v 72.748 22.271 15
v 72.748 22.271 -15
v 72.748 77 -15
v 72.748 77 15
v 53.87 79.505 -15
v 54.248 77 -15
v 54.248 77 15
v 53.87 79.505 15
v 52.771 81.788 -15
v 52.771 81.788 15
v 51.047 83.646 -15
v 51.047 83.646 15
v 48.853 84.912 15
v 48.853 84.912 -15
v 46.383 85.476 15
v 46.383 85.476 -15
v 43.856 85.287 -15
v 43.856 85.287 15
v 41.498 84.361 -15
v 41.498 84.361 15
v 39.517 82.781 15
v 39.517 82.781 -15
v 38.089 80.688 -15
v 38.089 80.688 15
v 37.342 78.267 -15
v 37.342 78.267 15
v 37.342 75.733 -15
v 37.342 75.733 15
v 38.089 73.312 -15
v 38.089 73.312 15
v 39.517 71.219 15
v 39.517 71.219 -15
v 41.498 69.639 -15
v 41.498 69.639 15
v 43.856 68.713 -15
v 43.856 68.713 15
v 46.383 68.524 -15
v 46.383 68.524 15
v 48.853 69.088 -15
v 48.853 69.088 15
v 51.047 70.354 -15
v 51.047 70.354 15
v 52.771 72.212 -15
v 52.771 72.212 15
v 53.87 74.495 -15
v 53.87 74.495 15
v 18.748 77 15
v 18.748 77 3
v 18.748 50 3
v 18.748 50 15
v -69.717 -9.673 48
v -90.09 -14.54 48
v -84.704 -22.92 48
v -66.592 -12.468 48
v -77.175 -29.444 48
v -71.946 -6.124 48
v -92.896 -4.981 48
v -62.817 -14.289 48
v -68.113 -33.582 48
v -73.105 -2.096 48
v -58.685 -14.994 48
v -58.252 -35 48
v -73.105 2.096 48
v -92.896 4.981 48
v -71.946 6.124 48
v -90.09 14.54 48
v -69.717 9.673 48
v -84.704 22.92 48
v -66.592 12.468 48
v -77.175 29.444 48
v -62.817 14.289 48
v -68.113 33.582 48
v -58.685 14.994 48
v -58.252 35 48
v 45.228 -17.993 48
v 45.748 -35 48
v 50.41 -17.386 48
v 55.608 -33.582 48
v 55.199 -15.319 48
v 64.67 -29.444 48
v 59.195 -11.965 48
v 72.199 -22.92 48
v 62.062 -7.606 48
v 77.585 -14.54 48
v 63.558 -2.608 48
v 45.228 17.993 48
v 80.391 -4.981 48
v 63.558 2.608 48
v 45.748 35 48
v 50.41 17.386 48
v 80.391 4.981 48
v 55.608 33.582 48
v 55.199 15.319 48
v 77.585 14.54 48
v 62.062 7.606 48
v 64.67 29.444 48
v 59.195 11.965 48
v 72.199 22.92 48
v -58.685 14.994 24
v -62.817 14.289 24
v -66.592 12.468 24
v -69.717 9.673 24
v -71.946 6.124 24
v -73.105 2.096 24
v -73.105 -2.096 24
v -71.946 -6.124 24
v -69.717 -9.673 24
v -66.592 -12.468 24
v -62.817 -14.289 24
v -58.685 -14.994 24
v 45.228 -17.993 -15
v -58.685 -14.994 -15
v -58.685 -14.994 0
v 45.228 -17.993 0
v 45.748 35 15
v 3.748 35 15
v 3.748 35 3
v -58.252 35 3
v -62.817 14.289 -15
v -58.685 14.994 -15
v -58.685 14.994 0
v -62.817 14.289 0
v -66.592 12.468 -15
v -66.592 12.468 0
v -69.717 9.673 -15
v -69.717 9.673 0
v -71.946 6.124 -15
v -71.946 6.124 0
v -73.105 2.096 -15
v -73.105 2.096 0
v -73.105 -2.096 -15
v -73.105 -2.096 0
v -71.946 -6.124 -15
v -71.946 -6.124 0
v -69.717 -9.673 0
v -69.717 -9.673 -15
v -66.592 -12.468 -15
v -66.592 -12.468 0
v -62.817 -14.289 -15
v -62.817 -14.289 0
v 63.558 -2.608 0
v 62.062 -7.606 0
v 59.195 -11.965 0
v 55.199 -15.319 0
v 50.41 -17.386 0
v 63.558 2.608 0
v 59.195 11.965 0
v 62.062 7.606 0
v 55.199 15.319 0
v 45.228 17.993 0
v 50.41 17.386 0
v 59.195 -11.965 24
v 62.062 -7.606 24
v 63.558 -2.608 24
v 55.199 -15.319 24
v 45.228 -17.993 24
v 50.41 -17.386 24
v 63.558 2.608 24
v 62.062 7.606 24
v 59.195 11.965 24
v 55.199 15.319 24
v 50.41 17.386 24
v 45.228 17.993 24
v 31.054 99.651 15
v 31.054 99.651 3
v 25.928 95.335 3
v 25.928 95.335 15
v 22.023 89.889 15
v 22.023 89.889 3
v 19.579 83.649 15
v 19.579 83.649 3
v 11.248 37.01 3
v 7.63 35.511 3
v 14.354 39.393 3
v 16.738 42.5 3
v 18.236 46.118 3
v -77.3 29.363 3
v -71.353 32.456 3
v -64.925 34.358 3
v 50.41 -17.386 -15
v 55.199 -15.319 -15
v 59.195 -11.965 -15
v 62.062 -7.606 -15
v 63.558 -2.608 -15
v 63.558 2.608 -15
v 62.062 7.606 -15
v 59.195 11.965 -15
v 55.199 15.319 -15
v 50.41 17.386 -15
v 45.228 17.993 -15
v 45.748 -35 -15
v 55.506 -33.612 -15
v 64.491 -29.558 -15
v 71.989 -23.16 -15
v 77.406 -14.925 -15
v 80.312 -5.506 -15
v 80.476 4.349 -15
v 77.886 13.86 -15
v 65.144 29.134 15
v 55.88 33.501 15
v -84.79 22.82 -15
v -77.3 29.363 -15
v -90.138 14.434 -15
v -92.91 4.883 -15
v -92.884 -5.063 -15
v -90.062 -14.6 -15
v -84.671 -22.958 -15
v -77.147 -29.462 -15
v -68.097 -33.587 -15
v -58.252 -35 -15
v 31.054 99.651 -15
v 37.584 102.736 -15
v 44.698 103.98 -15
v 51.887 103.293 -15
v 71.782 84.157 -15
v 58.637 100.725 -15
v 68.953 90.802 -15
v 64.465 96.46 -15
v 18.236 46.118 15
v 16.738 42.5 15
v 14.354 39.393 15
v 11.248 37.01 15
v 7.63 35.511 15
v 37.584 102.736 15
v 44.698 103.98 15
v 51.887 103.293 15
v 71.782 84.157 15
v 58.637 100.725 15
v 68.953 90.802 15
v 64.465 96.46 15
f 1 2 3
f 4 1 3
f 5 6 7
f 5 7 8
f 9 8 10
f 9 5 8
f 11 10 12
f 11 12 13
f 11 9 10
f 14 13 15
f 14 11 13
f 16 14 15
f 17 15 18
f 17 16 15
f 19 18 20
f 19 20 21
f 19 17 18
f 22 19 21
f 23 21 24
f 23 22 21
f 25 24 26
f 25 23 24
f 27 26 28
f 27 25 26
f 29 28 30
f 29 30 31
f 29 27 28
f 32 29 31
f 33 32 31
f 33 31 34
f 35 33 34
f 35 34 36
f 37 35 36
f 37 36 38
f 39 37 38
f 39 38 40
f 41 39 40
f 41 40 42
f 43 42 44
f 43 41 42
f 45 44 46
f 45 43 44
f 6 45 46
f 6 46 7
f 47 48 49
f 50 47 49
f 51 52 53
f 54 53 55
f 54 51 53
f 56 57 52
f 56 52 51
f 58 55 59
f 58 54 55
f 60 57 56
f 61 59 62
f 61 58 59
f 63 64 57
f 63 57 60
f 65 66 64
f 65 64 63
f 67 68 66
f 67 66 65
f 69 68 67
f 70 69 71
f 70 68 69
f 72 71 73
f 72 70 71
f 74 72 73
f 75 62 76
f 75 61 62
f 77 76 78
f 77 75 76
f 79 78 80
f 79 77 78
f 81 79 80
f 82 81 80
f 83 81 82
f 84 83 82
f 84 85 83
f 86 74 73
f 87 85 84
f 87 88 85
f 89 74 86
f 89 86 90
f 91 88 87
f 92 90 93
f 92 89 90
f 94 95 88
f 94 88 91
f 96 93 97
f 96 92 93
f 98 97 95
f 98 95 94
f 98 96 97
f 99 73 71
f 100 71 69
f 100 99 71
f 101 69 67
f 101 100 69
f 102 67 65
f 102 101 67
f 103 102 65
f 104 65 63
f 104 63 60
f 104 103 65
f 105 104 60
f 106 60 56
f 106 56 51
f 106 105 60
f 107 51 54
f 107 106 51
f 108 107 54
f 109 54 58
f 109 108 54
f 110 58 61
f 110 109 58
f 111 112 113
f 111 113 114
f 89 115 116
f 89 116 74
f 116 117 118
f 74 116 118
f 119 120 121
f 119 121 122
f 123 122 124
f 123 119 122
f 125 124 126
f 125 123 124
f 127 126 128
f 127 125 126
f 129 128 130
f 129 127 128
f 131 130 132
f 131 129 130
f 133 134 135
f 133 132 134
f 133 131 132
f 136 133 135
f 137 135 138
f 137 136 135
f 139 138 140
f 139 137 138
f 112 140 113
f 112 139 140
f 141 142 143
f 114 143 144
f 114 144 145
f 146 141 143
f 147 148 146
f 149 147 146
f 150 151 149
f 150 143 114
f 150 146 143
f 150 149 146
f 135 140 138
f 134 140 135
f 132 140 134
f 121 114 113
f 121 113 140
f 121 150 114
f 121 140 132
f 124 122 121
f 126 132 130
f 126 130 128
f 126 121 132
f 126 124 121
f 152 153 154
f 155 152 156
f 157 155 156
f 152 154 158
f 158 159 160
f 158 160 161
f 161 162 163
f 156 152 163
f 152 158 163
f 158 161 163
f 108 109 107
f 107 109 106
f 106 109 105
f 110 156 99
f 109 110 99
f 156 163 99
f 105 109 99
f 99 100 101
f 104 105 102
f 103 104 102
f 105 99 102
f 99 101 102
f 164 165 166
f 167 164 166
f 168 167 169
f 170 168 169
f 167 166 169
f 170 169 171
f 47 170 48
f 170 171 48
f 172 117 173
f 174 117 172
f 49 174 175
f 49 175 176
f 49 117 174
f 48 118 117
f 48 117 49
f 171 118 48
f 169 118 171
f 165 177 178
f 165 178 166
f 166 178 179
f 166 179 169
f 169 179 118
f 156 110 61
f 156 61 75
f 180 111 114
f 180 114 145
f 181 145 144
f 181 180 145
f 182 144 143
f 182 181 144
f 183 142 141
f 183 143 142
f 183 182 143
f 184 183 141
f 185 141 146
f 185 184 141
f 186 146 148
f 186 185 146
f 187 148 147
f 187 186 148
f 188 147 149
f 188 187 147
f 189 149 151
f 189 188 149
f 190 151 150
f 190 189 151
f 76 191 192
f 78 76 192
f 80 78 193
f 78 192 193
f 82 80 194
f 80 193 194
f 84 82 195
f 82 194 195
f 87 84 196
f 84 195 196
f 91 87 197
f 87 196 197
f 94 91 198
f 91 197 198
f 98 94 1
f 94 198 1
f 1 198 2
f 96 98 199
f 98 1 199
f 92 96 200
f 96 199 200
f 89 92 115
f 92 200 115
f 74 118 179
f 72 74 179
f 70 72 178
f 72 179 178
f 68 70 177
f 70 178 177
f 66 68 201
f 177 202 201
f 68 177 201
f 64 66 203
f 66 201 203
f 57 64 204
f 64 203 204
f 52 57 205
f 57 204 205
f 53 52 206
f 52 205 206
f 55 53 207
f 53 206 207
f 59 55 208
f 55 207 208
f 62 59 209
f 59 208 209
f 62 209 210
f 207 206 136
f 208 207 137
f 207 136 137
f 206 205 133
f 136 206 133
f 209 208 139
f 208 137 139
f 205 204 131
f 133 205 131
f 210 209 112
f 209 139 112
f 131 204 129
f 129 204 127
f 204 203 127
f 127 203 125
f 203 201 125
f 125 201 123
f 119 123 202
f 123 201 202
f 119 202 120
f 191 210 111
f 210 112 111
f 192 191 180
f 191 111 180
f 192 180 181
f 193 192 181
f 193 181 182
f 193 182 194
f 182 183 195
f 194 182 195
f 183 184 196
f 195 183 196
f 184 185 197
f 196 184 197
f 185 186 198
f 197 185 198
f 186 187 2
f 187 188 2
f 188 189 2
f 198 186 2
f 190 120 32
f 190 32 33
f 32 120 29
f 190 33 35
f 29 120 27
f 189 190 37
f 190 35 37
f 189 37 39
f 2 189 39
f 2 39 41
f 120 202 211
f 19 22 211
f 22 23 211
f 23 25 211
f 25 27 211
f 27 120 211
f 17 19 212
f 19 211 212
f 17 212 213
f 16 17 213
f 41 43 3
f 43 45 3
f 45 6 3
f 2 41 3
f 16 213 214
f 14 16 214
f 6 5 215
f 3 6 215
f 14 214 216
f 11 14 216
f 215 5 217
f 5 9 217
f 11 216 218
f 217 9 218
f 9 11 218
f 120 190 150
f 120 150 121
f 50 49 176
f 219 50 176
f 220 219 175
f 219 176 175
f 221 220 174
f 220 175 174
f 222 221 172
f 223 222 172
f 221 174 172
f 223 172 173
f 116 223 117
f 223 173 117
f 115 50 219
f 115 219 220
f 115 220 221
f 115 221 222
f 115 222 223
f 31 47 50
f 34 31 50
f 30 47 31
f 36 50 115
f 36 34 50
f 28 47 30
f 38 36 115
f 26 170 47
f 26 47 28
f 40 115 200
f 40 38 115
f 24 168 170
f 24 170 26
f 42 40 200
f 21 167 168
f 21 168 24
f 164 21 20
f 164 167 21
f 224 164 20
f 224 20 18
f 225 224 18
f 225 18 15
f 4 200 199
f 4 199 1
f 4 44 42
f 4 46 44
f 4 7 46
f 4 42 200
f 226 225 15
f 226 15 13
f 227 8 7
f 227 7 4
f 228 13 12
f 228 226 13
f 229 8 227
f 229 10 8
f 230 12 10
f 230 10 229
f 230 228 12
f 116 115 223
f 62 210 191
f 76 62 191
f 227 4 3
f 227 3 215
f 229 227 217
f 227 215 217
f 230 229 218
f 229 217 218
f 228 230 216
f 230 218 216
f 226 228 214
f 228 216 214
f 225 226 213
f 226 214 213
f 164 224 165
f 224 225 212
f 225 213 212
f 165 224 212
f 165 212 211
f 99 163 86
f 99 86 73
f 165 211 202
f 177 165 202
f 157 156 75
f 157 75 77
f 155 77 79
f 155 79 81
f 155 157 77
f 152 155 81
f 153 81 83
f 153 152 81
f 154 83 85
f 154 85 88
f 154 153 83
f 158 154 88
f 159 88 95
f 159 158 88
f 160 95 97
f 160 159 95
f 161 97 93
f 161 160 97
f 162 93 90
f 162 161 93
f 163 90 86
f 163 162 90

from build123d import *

# Parameters (mm, degrees)
BOSS_EXTRUDE3_DEPTH      = 48
BOSS_EXTRUDE3_DEPTH_BACK = 15
BOSS_EXTRUDE4_DEPTH      = 24
BOSS_EXTRUDE5_DEPTH      = 15
BOSS_EXTRUDE5_DEPTH_BACK = 15
SKETCH2_6_R              = 8.5
BOSS_EXTRUDE6_DEPTH      = 3
BOSS_EXTRUDE6_DEPTH_BACK = 15


with BuildPart() as part:
    # Sketch2 → Boss-Extrude3 (new, two sides: drawn at the far end of the back side and taken through both)
    with BuildSketch(Plane.XY.offset(-BOSS_EXTRUDE3_DEPTH_BACK)):
        with BuildLine():
            Line((3.747556009, 35), (-58.252443991, 35))
            ThreePointArc((-58.252443991, 35), (-68.184558925, 33.56118432), (-77.300074847, 29.363033883))
            ThreePointArc((-77.300074847, 29.363033883), (-91.813628311, -9.932114934), (-58.252443991, -35))
            Line((-58.252443991, -35), (45.747556009, -35))
            ThreePointArc((45.747556009, -35), (77.405785672, -14.925029132), (72.747556009, 22.271057451))
            ThreePointArc((72.747556009, 22.271057451), (60.672585141, 31.658229663), (45.747556009, 35))
            Line((45.747556009, 35), (3.747556009, 35))
        make_face()
        with BuildLine():
            Line((-58.685136299, 14.993757947), (45.22832524, 17.992509536))
            ThreePointArc((45.22832524, 17.992509536), (63.747556009, 0), (45.22832524, -17.992509536))
            Line((45.22832524, -17.992509536), (-58.685136299, -14.993757947))
            ThreePointArc((-58.685136299, -14.993757947), (-73.252443991, 0), (-58.685136299, 14.993757947))
        make_face(mode=Mode.SUBTRACT)
    extrude(amount=BOSS_EXTRUDE3_DEPTH + BOSS_EXTRUDE3_DEPTH_BACK)

    # Sketch2<5> → Boss-Extrude4 (add)
    with BuildSketch(Plane.XY):
        with BuildLine():
            ThreePointArc((45.22832524, -17.992509536), (63.747556009, 0), (45.22832524, 17.992509536))
            Line((45.22832524, 17.992509536), (-58.685136299, 14.993757947))
            ThreePointArc((-58.685136299, 14.993757947), (-73.252443991, 0), (-58.685136299, -14.993757947))
            Line((-58.685136299, -14.993757947), (45.22832524, -17.992509536))
        make_face()
    extrude(amount=BOSS_EXTRUDE4_DEPTH)

    # Sketch2<6> → Boss-Extrude5 (add, two sides: drawn at the far end of the back side and taken through both)
    with BuildSketch(Plane.XY.offset(-BOSS_EXTRUDE5_DEPTH_BACK)):
        with BuildLine():
            ThreePointArc((18.747556009, 50), (14.354157727, 39.393398282), (3.747556009, 35))
            Line((3.747556009, 35), (45.747556009, 35))
            ThreePointArc((45.747556009, 35), (60.672585141, 31.658229663), (72.747556009, 22.271057451))
            Line((72.747556009, 22.271057451), (72.747556009, 77))
            ThreePointArc((72.747556009, 77), (58.636796874, 100.724828132), (31.053669349, 99.651483281))
            ThreePointArc((31.053669349, 99.651483281), (22.022727876, 89.889240866), (18.747556009, 77))
            Line((18.747556009, 77), (18.747556009, 50))
        make_face()
        with Locations((45.747556009, 77)):
            Circle(SKETCH2_6_R, mode=Mode.SUBTRACT)
    extrude(amount=BOSS_EXTRUDE5_DEPTH + BOSS_EXTRUDE5_DEPTH_BACK)

    # Sketch2<7> → Boss-Extrude6 (add, two sides: drawn at the far end of the back side and taken through both)
    with BuildSketch(Plane.XY.offset(-BOSS_EXTRUDE6_DEPTH_BACK)):
        with BuildLine():
            ThreePointArc((-77.300074847, 29.363033883), (-68.184558925, 33.56118432), (-58.252443991, 35))
            Line((-58.252443991, 35), (3.747556009, 35))
            ThreePointArc((3.747556009, 35), (14.354157727, 39.393398282), (18.747556009, 50))
            Line((18.747556009, 50), (18.747556009, 77))
            ThreePointArc((18.747556009, 77), (22.022727876, 89.889240866), (31.053669349, 99.651483281))
            Line((31.053669349, 99.651483281), (-77.300074847, 29.363033883))
        make_face()
    extrude(amount=BOSS_EXTRUDE6_DEPTH + BOSS_EXTRUDE6_DEPTH_BACK)


solid = part.part
